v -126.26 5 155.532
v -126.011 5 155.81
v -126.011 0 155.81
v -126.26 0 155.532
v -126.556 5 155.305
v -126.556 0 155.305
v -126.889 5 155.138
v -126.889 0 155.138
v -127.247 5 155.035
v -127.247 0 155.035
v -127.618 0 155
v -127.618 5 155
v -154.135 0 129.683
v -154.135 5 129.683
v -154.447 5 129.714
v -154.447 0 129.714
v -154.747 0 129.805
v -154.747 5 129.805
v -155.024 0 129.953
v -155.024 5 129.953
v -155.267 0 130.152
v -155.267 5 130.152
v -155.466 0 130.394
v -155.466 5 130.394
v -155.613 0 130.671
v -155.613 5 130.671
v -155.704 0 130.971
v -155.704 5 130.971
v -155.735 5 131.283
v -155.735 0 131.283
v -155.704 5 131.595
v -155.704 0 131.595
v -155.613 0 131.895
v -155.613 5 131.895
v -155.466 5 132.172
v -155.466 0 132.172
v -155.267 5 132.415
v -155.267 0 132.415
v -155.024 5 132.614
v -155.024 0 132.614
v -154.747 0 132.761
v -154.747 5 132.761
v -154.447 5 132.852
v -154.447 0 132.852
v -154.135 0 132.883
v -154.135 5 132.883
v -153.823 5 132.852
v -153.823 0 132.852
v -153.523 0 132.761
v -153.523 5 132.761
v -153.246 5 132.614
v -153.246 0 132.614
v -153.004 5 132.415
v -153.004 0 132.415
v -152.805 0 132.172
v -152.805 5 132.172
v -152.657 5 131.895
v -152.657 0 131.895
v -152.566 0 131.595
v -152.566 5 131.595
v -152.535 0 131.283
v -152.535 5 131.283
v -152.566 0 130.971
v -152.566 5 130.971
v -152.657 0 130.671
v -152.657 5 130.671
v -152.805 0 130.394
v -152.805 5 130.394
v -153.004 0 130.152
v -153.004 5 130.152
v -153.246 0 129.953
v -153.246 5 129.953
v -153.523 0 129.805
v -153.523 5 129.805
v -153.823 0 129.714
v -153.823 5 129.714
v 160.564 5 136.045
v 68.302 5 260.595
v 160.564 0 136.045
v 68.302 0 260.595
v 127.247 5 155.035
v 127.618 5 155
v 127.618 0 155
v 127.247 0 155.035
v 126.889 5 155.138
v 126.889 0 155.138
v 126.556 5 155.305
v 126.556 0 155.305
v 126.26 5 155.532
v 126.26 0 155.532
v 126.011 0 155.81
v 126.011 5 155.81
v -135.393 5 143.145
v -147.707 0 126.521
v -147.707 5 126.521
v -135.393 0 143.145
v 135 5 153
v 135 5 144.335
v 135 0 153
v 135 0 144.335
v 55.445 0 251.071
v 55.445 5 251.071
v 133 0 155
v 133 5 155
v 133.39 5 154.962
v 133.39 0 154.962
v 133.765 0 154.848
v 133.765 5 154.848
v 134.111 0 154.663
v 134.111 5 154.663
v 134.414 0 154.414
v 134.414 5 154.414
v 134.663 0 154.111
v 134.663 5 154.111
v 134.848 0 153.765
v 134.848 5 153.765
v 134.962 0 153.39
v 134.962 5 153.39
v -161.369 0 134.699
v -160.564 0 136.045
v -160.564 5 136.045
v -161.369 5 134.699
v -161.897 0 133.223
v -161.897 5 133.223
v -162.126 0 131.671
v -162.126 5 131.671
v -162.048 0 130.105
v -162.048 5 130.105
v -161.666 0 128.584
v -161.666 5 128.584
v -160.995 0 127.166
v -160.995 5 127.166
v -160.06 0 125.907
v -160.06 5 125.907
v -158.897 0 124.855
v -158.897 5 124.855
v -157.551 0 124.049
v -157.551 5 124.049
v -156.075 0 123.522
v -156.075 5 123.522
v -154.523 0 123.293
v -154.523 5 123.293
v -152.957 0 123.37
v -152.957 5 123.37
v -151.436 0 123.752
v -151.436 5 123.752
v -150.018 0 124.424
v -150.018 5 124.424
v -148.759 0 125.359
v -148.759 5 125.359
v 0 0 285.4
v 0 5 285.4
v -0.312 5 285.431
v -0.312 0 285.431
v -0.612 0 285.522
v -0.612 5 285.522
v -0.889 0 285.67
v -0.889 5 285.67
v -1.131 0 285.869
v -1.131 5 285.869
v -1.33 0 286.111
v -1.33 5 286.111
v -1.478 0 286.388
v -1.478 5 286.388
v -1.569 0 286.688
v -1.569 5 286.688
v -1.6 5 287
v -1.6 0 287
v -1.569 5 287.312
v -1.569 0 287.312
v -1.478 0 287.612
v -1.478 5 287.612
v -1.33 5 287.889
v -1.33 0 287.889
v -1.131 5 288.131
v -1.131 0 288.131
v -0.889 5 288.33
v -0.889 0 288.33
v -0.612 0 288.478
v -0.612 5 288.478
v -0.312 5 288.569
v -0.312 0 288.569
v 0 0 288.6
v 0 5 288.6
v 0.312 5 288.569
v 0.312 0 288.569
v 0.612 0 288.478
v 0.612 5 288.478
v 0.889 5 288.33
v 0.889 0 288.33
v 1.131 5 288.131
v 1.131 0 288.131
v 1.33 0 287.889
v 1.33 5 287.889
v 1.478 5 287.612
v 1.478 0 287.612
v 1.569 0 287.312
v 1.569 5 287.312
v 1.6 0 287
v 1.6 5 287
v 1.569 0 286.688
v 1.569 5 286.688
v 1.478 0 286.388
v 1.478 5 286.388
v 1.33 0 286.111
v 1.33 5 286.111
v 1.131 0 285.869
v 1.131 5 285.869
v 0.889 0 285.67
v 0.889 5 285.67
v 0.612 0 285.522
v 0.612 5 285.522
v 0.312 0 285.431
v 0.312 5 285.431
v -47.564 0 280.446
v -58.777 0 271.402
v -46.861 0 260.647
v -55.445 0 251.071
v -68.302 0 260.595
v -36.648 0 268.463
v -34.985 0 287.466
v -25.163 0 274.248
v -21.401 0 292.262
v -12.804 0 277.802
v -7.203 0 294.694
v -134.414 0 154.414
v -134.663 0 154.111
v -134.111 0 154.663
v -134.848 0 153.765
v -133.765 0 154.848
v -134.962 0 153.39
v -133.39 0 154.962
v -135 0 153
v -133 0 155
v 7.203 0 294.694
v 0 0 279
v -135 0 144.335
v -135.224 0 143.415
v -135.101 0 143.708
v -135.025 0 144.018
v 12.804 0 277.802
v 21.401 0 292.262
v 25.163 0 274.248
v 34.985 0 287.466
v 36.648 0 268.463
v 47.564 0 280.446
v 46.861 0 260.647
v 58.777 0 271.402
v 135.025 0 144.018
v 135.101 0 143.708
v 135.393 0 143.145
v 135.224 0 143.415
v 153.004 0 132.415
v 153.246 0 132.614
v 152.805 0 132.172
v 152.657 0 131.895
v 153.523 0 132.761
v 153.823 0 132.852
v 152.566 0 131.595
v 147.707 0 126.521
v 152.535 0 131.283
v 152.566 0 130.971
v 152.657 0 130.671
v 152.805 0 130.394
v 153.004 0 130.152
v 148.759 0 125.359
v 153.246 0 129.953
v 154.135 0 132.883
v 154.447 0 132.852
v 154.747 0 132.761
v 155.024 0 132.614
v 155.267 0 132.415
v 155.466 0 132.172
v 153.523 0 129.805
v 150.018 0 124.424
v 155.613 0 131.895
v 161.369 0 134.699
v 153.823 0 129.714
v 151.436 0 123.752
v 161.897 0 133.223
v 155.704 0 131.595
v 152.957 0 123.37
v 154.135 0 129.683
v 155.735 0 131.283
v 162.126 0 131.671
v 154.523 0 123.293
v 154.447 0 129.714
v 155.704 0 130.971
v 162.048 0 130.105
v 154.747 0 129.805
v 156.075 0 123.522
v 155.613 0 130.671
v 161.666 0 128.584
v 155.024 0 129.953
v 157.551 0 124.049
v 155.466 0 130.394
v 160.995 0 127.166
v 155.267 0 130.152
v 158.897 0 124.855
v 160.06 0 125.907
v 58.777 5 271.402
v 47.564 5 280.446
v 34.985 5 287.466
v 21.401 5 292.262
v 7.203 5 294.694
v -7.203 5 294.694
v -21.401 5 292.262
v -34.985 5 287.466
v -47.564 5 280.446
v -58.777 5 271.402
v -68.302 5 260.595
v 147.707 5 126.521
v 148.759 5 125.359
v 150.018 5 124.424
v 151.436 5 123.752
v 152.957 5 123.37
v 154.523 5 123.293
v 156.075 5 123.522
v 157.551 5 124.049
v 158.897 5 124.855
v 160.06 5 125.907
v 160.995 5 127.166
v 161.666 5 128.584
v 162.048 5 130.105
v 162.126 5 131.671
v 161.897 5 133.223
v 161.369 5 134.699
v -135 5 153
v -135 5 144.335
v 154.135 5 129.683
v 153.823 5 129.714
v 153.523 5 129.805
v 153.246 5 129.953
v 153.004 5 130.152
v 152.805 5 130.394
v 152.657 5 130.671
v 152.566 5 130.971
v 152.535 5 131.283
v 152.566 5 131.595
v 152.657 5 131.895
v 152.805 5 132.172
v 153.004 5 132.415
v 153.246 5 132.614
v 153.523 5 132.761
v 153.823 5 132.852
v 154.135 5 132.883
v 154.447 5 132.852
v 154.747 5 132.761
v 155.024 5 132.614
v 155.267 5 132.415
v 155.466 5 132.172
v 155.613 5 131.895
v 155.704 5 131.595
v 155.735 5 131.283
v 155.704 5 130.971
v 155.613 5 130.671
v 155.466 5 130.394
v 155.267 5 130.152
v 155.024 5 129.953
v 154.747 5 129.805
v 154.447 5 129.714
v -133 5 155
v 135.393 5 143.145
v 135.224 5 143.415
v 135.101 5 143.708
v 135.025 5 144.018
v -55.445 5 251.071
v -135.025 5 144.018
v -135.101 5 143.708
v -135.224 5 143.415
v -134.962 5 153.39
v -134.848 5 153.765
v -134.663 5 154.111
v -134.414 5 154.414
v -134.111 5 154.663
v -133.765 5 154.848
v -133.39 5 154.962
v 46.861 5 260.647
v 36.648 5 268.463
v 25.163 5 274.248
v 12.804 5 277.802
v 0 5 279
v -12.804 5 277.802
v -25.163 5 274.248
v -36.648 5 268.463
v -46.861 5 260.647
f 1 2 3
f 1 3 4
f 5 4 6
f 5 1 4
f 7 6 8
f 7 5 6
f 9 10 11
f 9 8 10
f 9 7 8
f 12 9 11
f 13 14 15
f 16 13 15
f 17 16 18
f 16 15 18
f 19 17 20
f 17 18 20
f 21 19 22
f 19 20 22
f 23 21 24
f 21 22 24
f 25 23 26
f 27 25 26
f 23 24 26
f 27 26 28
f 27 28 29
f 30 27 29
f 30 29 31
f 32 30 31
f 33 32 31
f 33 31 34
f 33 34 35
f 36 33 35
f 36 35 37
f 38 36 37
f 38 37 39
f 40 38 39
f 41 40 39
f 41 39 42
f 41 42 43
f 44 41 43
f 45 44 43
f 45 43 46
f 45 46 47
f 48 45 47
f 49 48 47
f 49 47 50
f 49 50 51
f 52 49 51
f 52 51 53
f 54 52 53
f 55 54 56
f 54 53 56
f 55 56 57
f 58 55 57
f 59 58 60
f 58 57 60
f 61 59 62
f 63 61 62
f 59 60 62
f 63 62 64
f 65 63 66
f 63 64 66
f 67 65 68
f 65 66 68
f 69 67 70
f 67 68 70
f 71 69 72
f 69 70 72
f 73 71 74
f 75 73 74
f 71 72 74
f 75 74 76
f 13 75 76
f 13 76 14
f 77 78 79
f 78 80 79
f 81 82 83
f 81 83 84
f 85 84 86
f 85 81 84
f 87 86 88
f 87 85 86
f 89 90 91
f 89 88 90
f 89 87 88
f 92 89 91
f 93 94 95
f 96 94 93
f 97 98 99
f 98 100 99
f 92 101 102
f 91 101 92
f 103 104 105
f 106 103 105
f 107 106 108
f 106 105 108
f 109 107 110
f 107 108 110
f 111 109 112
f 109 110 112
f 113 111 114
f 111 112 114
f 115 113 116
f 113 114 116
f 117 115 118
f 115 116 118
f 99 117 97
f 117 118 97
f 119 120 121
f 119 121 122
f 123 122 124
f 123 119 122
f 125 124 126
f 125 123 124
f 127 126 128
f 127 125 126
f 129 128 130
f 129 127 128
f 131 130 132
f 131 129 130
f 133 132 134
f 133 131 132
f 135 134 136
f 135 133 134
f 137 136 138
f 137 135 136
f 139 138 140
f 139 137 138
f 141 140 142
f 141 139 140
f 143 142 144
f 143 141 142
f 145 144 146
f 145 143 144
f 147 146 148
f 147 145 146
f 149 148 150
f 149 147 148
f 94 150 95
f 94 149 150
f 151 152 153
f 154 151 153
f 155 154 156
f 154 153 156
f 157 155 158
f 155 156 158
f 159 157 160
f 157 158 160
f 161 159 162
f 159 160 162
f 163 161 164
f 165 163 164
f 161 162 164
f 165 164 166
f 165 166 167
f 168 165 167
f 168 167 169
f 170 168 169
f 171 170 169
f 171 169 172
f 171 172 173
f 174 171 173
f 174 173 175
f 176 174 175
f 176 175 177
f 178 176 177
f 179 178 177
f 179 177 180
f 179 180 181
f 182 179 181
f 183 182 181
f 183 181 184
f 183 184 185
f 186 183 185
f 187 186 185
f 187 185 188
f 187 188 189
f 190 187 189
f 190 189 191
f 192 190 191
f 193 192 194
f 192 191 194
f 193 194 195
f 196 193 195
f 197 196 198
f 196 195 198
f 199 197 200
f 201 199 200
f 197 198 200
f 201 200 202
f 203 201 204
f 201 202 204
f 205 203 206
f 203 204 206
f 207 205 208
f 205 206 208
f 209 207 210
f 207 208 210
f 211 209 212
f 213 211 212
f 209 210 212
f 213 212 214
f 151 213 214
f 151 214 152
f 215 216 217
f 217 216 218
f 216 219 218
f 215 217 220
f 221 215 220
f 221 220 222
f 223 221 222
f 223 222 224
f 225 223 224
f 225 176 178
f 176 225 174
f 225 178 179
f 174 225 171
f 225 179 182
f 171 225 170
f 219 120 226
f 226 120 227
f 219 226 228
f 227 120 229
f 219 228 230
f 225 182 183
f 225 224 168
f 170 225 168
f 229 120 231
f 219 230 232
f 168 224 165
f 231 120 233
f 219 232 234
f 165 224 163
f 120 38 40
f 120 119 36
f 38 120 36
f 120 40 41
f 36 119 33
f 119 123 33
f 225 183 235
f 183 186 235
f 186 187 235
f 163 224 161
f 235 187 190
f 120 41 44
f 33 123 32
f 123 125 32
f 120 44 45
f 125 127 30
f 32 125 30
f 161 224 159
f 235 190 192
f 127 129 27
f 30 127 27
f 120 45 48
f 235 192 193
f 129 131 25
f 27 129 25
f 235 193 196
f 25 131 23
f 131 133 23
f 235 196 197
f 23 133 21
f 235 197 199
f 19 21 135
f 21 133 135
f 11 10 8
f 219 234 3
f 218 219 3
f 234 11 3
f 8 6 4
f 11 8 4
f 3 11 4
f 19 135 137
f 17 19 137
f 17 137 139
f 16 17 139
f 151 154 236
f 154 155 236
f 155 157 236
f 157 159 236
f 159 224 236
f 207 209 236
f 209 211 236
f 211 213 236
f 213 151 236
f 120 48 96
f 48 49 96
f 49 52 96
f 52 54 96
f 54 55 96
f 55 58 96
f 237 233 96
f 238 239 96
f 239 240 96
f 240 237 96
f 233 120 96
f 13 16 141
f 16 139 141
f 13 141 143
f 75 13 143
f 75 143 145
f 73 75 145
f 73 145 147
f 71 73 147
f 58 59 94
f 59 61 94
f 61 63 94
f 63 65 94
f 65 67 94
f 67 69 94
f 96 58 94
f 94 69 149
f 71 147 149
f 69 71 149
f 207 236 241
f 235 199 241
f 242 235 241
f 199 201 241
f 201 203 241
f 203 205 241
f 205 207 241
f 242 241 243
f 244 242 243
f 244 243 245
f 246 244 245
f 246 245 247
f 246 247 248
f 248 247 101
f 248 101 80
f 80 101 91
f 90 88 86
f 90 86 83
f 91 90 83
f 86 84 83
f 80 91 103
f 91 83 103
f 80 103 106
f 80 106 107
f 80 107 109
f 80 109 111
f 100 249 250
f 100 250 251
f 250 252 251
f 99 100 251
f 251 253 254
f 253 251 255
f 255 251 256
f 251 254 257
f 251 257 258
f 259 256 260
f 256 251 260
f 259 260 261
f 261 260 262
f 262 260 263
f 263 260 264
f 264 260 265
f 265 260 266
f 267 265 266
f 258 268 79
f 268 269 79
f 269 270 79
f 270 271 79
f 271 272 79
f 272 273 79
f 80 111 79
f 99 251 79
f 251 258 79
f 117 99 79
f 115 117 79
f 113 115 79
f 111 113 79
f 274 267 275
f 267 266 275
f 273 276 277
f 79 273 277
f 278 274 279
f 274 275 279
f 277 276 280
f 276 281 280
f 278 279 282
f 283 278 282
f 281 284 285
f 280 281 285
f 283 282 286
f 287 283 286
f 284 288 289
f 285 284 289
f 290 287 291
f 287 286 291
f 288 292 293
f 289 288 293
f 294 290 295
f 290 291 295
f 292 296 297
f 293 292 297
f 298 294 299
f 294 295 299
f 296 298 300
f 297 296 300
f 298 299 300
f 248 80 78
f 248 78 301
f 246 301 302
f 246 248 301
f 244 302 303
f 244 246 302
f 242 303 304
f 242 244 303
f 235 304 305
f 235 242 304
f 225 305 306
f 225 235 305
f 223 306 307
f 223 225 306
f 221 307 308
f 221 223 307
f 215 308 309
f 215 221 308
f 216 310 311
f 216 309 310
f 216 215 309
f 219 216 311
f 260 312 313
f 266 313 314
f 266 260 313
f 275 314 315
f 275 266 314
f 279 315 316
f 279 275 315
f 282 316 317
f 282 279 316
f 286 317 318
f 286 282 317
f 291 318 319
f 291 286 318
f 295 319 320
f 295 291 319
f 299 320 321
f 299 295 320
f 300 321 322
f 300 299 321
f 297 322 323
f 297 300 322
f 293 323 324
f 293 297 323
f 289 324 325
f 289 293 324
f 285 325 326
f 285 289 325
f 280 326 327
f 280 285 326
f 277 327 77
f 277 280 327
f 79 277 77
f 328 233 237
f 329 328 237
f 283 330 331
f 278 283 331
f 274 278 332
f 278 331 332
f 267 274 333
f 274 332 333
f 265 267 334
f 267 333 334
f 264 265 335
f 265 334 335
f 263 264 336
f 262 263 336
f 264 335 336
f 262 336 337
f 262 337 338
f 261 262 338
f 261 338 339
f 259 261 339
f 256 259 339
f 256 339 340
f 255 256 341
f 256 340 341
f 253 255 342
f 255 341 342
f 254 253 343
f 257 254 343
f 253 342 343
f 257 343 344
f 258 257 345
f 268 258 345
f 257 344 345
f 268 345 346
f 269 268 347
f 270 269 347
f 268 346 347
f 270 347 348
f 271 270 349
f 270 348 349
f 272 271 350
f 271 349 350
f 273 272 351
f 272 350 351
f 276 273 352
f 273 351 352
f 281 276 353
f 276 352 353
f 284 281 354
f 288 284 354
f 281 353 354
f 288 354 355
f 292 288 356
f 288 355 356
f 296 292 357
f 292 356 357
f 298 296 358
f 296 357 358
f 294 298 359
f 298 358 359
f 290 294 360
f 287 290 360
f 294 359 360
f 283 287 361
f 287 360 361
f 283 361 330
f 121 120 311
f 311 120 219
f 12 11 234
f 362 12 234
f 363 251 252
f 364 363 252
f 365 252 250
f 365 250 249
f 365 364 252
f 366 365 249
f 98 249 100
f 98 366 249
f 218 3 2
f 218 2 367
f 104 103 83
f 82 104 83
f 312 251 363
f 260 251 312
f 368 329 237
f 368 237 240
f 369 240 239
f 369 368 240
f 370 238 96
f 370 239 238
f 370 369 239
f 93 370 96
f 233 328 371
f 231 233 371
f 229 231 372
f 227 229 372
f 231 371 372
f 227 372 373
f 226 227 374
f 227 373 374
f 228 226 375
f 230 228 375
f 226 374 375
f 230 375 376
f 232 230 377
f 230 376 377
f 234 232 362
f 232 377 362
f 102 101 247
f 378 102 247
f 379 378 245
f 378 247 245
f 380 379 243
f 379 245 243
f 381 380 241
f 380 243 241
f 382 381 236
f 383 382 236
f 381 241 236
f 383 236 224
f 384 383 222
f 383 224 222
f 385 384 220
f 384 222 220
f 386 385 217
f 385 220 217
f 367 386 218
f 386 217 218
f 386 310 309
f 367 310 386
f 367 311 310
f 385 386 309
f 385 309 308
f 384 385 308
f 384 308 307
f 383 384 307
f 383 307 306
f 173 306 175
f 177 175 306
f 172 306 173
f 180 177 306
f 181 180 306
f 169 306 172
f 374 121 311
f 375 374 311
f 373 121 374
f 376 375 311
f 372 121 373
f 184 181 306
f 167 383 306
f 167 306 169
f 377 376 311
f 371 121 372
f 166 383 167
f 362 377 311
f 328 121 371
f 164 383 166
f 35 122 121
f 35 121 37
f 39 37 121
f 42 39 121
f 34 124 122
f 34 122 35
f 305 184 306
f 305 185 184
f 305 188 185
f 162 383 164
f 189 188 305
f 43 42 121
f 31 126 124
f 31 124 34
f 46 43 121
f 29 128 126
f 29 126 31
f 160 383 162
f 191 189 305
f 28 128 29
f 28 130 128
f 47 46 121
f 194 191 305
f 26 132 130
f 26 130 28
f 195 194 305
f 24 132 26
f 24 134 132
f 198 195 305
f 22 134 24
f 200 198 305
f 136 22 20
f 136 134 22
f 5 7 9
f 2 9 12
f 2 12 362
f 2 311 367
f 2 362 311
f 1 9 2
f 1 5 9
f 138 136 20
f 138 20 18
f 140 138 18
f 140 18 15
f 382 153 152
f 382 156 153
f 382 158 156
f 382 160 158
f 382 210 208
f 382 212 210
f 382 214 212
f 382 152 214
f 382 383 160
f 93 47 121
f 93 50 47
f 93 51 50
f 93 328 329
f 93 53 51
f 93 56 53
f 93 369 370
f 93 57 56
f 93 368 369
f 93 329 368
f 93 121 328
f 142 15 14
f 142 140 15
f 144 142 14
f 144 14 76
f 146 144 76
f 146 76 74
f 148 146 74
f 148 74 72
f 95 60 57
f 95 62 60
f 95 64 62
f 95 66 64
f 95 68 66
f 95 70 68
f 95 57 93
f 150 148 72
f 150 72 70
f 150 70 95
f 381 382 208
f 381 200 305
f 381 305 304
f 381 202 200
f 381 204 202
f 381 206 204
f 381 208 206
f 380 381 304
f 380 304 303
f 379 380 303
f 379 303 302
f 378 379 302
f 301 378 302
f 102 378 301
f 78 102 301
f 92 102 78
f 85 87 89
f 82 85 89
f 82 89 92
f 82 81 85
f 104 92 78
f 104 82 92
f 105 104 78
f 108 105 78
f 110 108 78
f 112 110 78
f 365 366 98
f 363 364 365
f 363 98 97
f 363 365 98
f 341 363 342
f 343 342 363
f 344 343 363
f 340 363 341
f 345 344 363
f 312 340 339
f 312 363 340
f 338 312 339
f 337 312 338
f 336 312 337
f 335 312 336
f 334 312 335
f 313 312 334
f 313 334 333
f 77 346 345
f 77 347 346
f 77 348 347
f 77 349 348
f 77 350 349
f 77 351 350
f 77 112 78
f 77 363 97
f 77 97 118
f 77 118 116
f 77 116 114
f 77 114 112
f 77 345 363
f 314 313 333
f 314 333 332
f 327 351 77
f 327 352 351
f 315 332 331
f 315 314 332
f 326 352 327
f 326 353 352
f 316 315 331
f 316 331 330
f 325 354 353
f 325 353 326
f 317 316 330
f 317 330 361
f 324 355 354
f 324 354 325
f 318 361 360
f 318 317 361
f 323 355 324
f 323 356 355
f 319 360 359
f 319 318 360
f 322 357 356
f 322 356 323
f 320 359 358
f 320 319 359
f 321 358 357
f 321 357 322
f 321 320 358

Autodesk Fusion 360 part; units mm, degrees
sketch "スケッチ1" plane through (0, 0, 0) normal (0, 1, 0) x (1, 0, 0)
  circle A0 centre (0, 0) radius 210
  circle A1 centre (0, -210) radius 85
  line L0 (68.3017, -260.5952) -> (168.7454, -125)
  line L1 (-168.7454, -125) -> (-68.3017, -260.5952)
  circle A2 centre (0, -210) radius 77
  circle A3 centre (0, -210) radius 69
  line L2 (61.8733, -255.8333) -> (154.1352, -131.2832)
  line L3 (55.4449, -251.0714) -> (147.7068, -126.5213)
  line L4 (-61.8733, -255.8333) -> (-154.1352, -131.2832)
  line L5 (-147.7068, -126.5213) -> (-55.4449, -251.0714)
  circle A4 centre (154.1352, -131.2832) radius 8
  circle A5 centre (-154.1352, -131.2832) radius 8
  line L6 (0, -210) -> (0, -295)
  line L7 (-135, 0) -> (135, 0)
  line L8 (135, 0) -> (135, -155)
  line L9 (135, -155) -> (-135, -155)
  line L10 (-135, -155) -> (-135, 0)
  point P0 (0, -287)
  dimension "d1" = 420
  dimension "d2" = 170
  dimension "d3" = 210
  dimension "d4" = 155
  dimension "d5" = 16
  dimension "d13" = 270
  dimension "d14" = 155
extrude "押し出し1" add sketch "スケッチ1" along normal blind 5 contours A0 A5 | A0 A5 | A0 A1 L1 L4 A5 | A0 A4 | A0 A4 | A0 A1 L0 L2 A4 | A0 L4 A5 | A0 L4 L5 A5 L9 L10 | A1 A2 L4 L6 | A0 L2 A4 | A1 A2 L2 L6 | A0 A1 L4 L5 | A1 A2 L4 L5 | A0 A1 L2 L3 | A0 L2 L3 A4 L8 L9 | A1 A2 L2 L3 | A2 A3 L3 L6 | A2 A3 L5 L6
hole "穴1" at (0, 0, 287) at (-154.1352, 0, 131.2832) at (154.1352, 0, 131.2832) direction (0, 1, 0) diameter 3.2 end through all
fillet "フィレット1" radius 2 6 edges at (135, 2.5, 155) (-135, 2.5, 155) (126.6109, 2.5, 155) (135, 2.5, 143.675) (-135, 2.5, 143.675) (-126.6109, 2.5, 155)
